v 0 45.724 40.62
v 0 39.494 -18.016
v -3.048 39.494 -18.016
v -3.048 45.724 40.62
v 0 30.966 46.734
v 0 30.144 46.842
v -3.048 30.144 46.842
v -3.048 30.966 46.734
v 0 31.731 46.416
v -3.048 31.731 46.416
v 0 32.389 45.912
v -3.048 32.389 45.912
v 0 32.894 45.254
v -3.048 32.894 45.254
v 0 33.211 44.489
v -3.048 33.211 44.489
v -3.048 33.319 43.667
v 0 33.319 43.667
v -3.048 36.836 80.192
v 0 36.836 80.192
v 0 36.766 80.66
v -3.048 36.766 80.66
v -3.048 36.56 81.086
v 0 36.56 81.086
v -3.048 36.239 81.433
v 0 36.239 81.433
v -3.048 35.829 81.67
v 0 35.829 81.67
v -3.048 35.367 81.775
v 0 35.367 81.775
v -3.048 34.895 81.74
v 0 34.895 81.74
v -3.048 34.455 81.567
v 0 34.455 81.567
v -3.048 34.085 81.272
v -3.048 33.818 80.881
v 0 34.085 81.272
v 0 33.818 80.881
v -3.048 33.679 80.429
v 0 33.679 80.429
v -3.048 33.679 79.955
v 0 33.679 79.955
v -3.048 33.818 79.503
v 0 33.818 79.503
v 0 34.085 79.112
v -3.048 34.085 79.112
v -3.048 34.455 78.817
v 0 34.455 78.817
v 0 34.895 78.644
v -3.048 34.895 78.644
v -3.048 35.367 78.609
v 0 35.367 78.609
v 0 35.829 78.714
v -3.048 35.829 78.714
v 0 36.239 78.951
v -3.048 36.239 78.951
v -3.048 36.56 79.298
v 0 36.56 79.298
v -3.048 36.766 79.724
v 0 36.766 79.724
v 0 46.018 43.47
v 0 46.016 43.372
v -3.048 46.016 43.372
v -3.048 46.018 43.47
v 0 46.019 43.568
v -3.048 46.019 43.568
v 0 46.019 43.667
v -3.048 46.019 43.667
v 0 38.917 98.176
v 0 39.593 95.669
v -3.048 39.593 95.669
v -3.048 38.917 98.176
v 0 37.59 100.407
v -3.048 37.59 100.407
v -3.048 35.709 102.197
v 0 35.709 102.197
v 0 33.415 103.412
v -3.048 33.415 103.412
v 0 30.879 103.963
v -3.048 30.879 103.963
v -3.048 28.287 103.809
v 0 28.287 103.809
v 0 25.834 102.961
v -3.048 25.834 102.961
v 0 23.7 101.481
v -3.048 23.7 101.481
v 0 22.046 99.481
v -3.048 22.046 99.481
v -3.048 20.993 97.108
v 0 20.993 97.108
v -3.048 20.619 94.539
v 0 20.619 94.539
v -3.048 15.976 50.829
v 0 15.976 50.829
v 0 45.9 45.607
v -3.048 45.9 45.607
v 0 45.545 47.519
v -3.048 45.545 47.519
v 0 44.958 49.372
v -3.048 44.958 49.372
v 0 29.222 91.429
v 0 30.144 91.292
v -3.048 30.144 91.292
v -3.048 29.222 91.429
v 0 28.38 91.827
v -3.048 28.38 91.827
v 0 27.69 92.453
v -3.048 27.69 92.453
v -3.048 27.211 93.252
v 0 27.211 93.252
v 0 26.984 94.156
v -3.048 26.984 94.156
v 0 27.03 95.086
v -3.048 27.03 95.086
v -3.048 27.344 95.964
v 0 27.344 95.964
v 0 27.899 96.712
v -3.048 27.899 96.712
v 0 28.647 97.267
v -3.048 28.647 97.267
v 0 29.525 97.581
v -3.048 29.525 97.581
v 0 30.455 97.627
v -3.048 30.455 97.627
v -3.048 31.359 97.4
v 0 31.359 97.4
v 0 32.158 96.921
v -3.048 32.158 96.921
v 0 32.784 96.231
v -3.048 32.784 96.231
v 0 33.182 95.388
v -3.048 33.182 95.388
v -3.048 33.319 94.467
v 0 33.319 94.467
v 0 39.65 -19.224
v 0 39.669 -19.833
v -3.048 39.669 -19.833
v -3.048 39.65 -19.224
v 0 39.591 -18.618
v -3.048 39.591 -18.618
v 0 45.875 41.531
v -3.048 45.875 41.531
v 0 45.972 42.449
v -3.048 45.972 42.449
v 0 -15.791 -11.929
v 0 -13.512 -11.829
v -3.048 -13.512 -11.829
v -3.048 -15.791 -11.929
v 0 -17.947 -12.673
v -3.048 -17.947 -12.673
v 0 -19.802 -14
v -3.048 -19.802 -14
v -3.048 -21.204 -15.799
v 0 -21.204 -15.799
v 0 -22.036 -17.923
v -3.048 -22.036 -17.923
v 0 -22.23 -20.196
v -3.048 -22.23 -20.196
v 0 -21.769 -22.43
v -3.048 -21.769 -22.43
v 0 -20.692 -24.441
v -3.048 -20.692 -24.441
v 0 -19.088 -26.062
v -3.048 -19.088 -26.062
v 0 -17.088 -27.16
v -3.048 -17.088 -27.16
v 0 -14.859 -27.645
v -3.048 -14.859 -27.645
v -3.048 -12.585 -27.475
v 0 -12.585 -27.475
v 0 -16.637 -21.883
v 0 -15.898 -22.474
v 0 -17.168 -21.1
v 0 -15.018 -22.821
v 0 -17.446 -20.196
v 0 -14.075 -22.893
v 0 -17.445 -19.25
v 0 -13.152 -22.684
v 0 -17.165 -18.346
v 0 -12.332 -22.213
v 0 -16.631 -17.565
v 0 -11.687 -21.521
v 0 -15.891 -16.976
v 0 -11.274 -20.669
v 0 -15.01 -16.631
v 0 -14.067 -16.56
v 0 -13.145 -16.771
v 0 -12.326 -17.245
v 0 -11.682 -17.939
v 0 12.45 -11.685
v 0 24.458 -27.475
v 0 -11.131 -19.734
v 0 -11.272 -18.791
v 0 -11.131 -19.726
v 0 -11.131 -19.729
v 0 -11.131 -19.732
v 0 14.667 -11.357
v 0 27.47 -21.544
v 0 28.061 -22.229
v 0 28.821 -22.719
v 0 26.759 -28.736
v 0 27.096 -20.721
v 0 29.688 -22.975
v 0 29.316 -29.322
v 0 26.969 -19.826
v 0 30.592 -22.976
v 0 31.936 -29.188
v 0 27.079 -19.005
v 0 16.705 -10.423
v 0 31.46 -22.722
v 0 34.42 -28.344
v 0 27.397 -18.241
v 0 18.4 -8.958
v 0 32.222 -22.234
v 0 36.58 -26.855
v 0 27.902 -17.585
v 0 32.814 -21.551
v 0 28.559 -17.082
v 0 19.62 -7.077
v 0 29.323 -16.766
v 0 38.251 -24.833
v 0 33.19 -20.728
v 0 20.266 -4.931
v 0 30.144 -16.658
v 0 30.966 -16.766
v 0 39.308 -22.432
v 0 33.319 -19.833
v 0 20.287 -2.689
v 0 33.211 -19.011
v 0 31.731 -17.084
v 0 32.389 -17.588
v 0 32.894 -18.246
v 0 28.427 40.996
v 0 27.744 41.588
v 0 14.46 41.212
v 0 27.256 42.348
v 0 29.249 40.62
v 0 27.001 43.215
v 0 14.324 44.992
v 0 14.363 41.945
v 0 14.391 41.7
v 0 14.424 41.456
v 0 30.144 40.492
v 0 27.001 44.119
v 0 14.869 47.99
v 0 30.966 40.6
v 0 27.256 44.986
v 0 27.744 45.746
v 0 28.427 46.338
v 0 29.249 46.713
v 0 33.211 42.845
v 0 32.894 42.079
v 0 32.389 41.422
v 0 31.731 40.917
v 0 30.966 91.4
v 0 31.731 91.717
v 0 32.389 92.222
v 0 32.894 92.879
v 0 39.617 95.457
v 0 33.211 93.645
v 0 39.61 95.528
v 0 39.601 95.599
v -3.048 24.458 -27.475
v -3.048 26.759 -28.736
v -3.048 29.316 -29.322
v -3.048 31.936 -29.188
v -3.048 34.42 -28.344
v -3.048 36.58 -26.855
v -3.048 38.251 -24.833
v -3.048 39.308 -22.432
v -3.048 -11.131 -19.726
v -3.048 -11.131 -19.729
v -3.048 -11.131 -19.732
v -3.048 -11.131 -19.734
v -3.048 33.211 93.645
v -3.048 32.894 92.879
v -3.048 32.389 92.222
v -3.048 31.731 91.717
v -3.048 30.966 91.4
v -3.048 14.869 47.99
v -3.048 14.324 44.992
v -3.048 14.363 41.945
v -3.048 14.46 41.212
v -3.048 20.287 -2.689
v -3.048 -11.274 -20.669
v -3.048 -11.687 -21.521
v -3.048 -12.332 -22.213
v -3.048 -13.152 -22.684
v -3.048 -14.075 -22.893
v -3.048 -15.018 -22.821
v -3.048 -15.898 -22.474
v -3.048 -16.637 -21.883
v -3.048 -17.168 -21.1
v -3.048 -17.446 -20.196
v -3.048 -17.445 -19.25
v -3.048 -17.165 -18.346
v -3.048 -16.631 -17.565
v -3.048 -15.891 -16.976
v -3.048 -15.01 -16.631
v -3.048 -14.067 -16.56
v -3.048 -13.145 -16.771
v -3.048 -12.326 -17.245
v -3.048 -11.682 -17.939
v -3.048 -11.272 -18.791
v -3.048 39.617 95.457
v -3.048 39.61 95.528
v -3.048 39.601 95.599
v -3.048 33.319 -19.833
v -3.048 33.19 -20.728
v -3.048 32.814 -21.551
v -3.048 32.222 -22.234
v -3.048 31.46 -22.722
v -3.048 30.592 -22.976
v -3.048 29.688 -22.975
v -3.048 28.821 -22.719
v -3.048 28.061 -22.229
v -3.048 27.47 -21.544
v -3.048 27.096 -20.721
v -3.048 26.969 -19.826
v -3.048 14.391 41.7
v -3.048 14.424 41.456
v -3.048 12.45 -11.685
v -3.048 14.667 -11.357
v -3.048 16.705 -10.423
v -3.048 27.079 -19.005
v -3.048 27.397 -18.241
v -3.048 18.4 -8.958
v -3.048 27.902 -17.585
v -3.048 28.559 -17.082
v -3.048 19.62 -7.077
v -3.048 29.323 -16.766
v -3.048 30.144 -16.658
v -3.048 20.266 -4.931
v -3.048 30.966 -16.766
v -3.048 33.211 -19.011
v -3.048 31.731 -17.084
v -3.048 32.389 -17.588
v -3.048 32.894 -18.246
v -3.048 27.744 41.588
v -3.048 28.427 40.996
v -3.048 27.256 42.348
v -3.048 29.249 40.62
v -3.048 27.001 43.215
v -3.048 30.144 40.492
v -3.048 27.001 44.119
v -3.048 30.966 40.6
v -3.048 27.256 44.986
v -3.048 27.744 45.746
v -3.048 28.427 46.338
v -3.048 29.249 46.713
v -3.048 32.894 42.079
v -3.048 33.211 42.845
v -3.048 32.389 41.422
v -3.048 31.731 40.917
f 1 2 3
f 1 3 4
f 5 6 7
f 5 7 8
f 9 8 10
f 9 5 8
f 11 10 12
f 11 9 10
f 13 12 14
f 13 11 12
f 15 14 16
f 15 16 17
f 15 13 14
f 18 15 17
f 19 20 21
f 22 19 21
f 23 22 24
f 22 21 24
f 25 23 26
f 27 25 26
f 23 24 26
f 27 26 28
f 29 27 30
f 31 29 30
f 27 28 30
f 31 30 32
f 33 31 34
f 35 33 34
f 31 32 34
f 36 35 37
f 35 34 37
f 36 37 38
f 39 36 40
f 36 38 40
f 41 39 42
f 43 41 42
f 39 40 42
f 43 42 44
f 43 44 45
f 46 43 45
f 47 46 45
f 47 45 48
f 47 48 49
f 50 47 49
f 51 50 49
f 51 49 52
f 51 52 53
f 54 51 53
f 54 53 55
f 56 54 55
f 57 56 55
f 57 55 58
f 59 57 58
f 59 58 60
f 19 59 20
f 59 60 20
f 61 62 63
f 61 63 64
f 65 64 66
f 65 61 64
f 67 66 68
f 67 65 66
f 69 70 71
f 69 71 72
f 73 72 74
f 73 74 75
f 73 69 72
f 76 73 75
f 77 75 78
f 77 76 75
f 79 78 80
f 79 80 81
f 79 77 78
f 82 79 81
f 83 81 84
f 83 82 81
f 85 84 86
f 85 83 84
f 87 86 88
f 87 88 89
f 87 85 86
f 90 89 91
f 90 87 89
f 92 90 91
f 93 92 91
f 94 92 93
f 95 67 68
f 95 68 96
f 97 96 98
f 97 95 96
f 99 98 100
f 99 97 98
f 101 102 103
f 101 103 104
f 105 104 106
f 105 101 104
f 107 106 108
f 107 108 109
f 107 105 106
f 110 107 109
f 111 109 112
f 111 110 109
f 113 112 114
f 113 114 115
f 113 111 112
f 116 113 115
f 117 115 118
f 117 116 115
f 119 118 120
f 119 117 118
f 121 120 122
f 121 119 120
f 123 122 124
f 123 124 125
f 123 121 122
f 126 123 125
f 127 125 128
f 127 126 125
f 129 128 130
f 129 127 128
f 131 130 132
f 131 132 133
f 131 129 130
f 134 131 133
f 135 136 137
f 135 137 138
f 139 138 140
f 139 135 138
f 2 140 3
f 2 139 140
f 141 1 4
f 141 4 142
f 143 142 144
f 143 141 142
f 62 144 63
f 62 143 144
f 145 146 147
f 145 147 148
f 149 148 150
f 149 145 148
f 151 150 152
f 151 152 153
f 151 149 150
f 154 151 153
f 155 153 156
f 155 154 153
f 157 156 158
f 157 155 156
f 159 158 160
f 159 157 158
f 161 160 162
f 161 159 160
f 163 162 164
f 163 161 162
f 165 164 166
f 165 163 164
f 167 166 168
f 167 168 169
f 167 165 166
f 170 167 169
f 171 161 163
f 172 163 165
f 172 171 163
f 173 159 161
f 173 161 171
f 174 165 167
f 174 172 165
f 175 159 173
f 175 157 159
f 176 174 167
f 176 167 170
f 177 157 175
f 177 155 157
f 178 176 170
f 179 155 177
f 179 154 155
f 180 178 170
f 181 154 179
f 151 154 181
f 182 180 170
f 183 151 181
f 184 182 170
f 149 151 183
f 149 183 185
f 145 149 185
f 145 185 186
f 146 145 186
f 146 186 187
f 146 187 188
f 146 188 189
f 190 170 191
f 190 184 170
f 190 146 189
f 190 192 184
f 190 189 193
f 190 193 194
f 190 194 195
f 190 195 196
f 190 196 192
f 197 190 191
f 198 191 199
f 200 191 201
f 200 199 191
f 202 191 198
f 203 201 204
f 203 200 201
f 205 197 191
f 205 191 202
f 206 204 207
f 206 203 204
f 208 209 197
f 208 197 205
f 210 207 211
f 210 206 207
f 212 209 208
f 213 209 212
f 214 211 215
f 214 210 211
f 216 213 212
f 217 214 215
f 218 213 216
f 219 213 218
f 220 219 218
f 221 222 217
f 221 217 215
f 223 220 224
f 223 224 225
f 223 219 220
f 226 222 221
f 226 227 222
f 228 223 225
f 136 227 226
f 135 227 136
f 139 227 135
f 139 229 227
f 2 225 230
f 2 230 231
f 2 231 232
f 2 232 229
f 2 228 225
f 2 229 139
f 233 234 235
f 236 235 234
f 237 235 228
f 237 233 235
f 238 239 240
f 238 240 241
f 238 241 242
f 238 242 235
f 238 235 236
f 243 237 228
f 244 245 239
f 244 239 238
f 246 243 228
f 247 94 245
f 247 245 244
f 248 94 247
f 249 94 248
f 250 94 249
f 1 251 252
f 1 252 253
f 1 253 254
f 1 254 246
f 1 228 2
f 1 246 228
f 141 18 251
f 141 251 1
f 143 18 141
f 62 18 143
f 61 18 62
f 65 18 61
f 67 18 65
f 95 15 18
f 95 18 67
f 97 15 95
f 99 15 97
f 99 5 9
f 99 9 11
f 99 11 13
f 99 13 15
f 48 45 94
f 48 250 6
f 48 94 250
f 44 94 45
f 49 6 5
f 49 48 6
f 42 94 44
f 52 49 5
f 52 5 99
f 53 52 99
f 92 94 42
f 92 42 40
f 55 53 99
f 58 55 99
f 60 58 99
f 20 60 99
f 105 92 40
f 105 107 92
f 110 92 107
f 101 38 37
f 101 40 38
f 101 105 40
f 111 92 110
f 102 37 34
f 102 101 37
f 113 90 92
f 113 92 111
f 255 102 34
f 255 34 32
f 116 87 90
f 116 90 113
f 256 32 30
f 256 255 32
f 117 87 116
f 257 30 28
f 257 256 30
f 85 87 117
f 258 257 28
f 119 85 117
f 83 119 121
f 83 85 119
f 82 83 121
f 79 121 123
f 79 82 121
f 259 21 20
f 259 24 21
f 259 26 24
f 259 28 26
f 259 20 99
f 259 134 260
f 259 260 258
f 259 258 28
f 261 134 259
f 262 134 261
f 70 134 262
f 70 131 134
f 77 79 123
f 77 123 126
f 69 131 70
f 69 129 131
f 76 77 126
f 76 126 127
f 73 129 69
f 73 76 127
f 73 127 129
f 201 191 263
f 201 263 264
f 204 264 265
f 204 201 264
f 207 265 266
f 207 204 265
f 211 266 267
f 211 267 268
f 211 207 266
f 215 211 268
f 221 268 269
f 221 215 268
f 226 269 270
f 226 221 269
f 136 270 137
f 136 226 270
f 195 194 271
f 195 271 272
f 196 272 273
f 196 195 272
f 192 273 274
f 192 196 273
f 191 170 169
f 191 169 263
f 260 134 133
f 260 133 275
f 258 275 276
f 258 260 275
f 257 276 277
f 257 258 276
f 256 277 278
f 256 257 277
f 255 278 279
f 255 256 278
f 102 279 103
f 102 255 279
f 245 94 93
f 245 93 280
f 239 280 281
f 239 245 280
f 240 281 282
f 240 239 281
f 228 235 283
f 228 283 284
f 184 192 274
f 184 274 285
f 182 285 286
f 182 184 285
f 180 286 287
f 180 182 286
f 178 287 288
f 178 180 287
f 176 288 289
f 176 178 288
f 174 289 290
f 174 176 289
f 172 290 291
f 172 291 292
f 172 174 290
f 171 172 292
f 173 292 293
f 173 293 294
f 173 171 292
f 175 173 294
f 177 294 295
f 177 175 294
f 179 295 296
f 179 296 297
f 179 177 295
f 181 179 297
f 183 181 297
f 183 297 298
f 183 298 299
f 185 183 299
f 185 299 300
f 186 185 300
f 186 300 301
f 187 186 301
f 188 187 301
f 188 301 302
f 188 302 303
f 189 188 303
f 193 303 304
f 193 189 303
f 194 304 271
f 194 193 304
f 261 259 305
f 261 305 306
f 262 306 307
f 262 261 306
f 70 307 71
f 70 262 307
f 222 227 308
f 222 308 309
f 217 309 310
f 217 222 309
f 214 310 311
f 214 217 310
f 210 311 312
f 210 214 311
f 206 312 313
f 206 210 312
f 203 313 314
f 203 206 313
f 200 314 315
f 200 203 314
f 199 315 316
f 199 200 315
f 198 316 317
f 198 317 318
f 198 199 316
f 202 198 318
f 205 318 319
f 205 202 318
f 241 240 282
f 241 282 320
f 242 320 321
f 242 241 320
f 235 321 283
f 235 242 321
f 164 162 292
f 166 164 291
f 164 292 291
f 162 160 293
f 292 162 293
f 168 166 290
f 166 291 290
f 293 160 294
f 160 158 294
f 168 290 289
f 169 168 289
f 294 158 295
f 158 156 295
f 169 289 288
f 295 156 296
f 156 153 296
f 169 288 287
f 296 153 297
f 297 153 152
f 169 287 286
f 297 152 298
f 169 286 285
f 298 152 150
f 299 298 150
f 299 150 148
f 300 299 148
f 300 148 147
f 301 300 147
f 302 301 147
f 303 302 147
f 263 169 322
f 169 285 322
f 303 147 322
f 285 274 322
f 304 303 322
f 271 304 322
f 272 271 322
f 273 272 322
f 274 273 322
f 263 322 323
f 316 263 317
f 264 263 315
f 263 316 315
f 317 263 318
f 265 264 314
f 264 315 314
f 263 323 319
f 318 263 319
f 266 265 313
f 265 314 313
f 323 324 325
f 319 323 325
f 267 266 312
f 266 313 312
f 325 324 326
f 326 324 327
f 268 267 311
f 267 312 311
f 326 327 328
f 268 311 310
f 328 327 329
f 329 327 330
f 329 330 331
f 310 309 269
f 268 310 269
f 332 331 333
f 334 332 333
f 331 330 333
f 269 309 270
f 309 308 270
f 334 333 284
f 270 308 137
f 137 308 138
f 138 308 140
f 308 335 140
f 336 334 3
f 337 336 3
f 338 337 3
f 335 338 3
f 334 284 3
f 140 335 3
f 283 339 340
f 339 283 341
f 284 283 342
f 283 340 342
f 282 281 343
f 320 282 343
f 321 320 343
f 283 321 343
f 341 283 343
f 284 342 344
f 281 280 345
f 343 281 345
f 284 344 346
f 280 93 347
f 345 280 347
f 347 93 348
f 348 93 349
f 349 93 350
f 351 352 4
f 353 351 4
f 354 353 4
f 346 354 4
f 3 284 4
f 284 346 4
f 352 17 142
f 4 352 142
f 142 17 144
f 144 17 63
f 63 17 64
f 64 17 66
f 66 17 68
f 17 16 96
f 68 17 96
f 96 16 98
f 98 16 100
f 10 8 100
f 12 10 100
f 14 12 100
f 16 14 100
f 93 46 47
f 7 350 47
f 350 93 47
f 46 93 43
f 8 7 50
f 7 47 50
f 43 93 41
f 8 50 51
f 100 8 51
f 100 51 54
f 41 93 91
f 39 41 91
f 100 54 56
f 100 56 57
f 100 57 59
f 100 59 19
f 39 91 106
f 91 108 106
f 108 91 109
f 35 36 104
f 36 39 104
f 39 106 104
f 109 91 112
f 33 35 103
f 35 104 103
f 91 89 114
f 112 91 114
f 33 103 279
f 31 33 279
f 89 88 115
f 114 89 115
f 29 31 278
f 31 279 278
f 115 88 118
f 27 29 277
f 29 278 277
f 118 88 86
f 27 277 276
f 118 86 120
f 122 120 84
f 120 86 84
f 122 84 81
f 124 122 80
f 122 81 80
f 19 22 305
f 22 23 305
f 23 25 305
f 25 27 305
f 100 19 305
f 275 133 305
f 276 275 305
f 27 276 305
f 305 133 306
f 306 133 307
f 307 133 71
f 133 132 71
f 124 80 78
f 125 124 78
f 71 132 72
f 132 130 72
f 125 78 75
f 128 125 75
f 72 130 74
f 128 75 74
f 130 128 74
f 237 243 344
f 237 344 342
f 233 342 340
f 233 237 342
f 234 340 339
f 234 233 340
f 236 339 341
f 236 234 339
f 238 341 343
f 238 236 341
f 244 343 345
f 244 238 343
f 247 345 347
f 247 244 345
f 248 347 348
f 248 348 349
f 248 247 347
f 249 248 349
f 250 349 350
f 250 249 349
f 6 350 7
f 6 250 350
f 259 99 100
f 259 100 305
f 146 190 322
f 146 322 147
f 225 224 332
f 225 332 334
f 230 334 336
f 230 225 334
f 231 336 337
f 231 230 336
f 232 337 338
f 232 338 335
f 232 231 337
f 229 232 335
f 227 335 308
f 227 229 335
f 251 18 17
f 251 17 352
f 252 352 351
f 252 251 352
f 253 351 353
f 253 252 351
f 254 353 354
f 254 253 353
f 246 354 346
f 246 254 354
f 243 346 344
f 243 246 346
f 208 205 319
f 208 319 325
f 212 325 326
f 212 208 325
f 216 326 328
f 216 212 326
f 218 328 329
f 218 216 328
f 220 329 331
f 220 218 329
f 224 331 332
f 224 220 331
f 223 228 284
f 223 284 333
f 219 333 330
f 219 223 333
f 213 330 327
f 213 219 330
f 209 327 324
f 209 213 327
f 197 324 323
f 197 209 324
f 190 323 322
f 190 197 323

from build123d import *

# Parameters (mm, degrees)
F0_R     = 1.5875
F1_DEPTH = 3.048


with BuildPart() as f1:
    # F0 (on Right) → F1 (new body)
    with BuildSketch(Plane.YZ):
        with BuildLine():
            ThreePointArc((20.6192658602, 94.538977478), (23.3833367864, 87.7571874382), (30.1439925328, 84.9418192372))
            ThreePointArc((30.1439925328, 84.9418192372), (36.8791846236, 87.7316271464), (39.6689925328, 94.4668192372))
            ThreePointArc((39.6689925328, 94.4668192372), (39.6560750954, 94.9627126954), (39.6173578196, 95.4572611305))
            Line((39.6173578196, 95.4572611305), (39.5927784781, 95.6693453948))
            ThreePointArc((39.5927784781, 95.6693453948), (29.577534542, 103.9749605038), (20.6192658602, 94.538977478))
        make_face()
        with BuildLine():
            ThreePointArc((33.3189925328, 94.4668192372), (32.3890565631, 92.221755207), (30.1439925328, 91.2918192372))
            ThreePointArc((30.1439925328, 91.2918192372), (27.8989285025, 96.7118832675), (33.3189925328, 94.4668192372))
        make_face(mode=Mode.SUBTRACT)
        with BuildLine():
            ThreePointArc((39.6689925328, 94.4668192372), (36.8791846236, 87.7316271464), (30.1439925328, 84.9418192372))
            Line((30.1439925328, 84.9418192372), (30.1439925328, 59.5418192372))
            ThreePointArc((30.1439925328, 59.5418192372), (39.1285508172, 56.754727299), (44.9583639095, 49.3720822211))
            Line((44.9583639095, 49.3720822211), (39.6173578196, 95.4572611305))
            ThreePointArc((39.6173578196, 95.4572611305), (39.6560750954, 94.9627126954), (39.6689925328, 94.4668192372))
        make_face()
        with Locations((35.2487452328, 80.1920192372)):
            Circle(F0_R, mode=Mode.SUBTRACT)
        with BuildLine():
            Line((30.1439925328, 59.5418192372), (30.1439925328, 84.9418192372))
            ThreePointArc((30.1439925328, 84.9418192372), (23.3833367864, 87.7571874382), (20.6192658602, 94.538977478))
            Line((20.6192658602, 94.538977478), (15.9762797521, 50.8286304302))
            ThreePointArc((15.9762797521, 50.8286304302), (21.8276870937, 57.1891965742), (30.1439925328, 59.5418192372))
        make_face()
        with BuildLine():
            ThreePointArc((44.9583639095, 49.3720822211), (39.1285508172, 56.754727299), (30.1439925328, 59.5418192372))
            Line((30.1439925328, 59.5418192372), (30.1439925328, 46.8418192372))
            ThreePointArc((30.1439925328, 46.8418192372), (32.3890565631, 45.9118832675), (33.3189925328, 43.6668192372))
            ThreePointArc((33.3189925328, 43.6668192372), (32.3890565631, 41.421755207), (30.1439925328, 40.4918192372))
            Line((30.1439925328, 40.4918192372), (30.1439925328, 27.7918192372))
            ThreePointArc((30.1439925328, 27.7918192372), (40.2348384207, 31.4115977269), (45.7239045432, 40.6201872035))
            Line((45.7239045432, 40.6201872035), (46.0162507225, 43.3717854106))
            ThreePointArc((46.0162507225, 43.3717854106), (46.0183070654, 43.519295954), (46.0189925328, 43.6668192372))
            ThreePointArc((46.0189925328, 43.6668192372), (45.7515831637, 46.5683256904), (44.9583639095, 49.3720822211))
        make_face()
        with BuildLine():
            Line((30.1439925328, 46.8418192372), (30.1439925328, 59.5418192372))
            ThreePointArc((30.1439925328, 59.5418192372), (21.8276870937, 57.1891965742), (15.9762797521, 50.8286304302))
            ThreePointArc((15.9762797521, 50.8286304302), (14.5245790346, 46.5039915923), (14.362635633, 41.9450761088))
            Line((14.362635633, 41.9450761088), (14.4599248422, 41.2121001744))
            ThreePointArc((14.4599248422, 41.2121001744), (19.8229712685, 31.6048067575), (30.1439925328, 27.7918192372))
            Line((30.1439925328, 27.7918192372), (30.1439925328, 40.4918192372))
            ThreePointArc((30.1439925328, 40.4918192372), (26.9689925328, 43.6668192372), (30.1439925328, 46.8418192372))
        make_face()
        with BuildLine():
            ThreePointArc((39.6173578196, 95.4572611305), (39.6056624037, 95.5633721334), (39.5927784781, 95.6693453948))
            Line((39.5927784781, 95.6693453948), (39.6173578196, 95.4572611305))
        make_face()
        with BuildLine():
            Line((14.4599248422, 41.2121001744), (14.362635633, 41.9450761088))
            ThreePointArc((14.362635633, 41.9450761088), (14.4070122128, 41.578021639), (14.4599248422, 41.2121001744))
        make_face()
        with BuildLine():
            ThreePointArc((45.7239045432, 40.6201872035), (40.2348384207, 31.4115977269), (30.1439925328, 27.7918192372))
            Line((30.1439925328, 27.7918192372), (30.1439925328, -10.3081807628))
            ThreePointArc((30.1439925328, -10.3081807628), (36.2027481756, -12.4835477746), (39.4940461474, -18.0160064718))
            Line((39.4940461474, -18.0160064718), (45.7239045432, 40.6201872035))
        make_face()
        with BuildLine():
            Line((30.1439925328, -10.3081807628), (30.1439925328, 27.7918192372))
            ThreePointArc((30.1439925328, 27.7918192372), (19.8229712685, 31.6048067575), (14.4599248422, 41.2121001744))
            Line((14.4599248422, 41.2121001744), (20.2870354782, -2.6892933731))
            ThreePointArc((20.2870354782, -2.6892933731), (18.4004499897, -8.9575963205), (12.4498462988, -11.6854420564))
            Line((12.4498462988, -11.6854420564), (-13.5119950672, -11.8287714378))
            ThreePointArc((-13.5119950672, -11.8287714378), (-8.4193114637, -14.4019187635), (-6.3685074672, -19.7264578433))
            ThreePointArc((-6.3685074672, -19.7264578433), (-6.3685131868, -19.7359866548), (-6.3685303455, -19.7455154525))
            Line((-6.3685303455, -19.7455154525), (20.6190199868, -19.8103116316))
            ThreePointArc((20.6190199868, -19.8103116316), (23.4168907599, -13.0899080605), (30.1439925328, -10.3081807628))
        make_face()
        with BuildLine():
            ThreePointArc((45.7239045432, 40.6201872035), (45.9301439241, 41.9896045066), (46.0162507225, 43.3717854106))
            Line((46.0162507225, 43.3717854106), (45.7239045432, 40.6201872035))
        make_face()
        with BuildLine():
            ThreePointArc((39.4940461474, -18.0160064718), (36.2027481756, -12.4835477746), (30.1439925328, -10.3081807628))
            Line((30.1439925328, -10.3081807628), (30.1439925328, -16.6581807628))
            ThreePointArc((30.1439925328, -16.6581807628), (32.3890565631, -17.5881167325), (33.3189925328, -19.8331807628))
            ThreePointArc((33.3189925328, -19.8331807628), (30.1401810082, -23.0081784749), (26.9690016841, -19.8255577191))
            Line((26.9690016841, -19.8255577191), (20.6190199868, -19.8103116316))
            ThreePointArc((20.6190199868, -19.8103116316), (21.6276394845, -24.0990166429), (24.4582910855, -27.4750669208))
            ThreePointArc((24.4582910855, -27.4750669208), (34.4200490522, -28.3444066229), (39.6689925328, -19.8331807628))
            ThreePointArc((39.6689925328, -19.8331807628), (39.6251550586, -18.9203926382), (39.4940461474, -18.0160064718))
        make_face()
        with BuildLine():
            ThreePointArc((24.4582910855, -27.4750669208), (21.6276394845, -24.0990166429), (20.6190199868, -19.8103116316))
            Line((20.6190199868, -19.8103116316), (-6.3685303455, -19.7455154525))
            ThreePointArc((-6.3685303455, -19.7455154525), (-8.1205720343, -24.7008215972), (-12.5846813465, -27.4750669208))
            Line((-12.5846813465, -27.4750669208), (24.4582910855, -27.4750669208))
        make_face()
        with BuildLine():
            ThreePointArc((-12.5846813465, -27.4750669208), (-8.1205720343, -24.7008215972), (-6.3685303455, -19.7455154525))
            ThreePointArc((-6.3685303455, -19.7455154525), (-6.3685131868, -19.7359866548), (-6.3685074672, -19.7264578433))
            ThreePointArc((-6.3685074672, -19.7264578433), (-8.4193114637, -14.4019187635), (-13.5119950672, -11.8287714378))
            ThreePointArc((-13.5119950672, -11.8287714378), (-22.229603403, -20.1960679971), (-12.5846813465, -27.4750669208))
        make_face()
        with BuildLine():
            ThreePointArc((-11.1310074672, -19.7264578433), (-11.131009755, -19.7302693679), (-11.1310166185, -19.734080887))
            ThreePointArc((-11.1310166185, -19.734080887), (-17.4810051794, -19.7226463187), (-11.1310074672, -19.7264578433))
        make_face(mode=Mode.SUBTRACT)
        with BuildLine():
            Line((30.1439925328, -16.6581807628), (30.1439925328, -10.3081807628))
            ThreePointArc((30.1439925328, -10.3081807628), (23.4168907599, -13.0899080605), (20.6190199868, -19.8103116316))
            Line((20.6190199868, -19.8103116316), (26.9690016841, -19.8255577191))
            ThreePointArc((26.9690016841, -19.8255577191), (27.9016252752, -17.5854231953), (30.1439925328, -16.6581807628))
        make_face()
    extrude(amount=-F1_DEPTH)


solid = f1.part
